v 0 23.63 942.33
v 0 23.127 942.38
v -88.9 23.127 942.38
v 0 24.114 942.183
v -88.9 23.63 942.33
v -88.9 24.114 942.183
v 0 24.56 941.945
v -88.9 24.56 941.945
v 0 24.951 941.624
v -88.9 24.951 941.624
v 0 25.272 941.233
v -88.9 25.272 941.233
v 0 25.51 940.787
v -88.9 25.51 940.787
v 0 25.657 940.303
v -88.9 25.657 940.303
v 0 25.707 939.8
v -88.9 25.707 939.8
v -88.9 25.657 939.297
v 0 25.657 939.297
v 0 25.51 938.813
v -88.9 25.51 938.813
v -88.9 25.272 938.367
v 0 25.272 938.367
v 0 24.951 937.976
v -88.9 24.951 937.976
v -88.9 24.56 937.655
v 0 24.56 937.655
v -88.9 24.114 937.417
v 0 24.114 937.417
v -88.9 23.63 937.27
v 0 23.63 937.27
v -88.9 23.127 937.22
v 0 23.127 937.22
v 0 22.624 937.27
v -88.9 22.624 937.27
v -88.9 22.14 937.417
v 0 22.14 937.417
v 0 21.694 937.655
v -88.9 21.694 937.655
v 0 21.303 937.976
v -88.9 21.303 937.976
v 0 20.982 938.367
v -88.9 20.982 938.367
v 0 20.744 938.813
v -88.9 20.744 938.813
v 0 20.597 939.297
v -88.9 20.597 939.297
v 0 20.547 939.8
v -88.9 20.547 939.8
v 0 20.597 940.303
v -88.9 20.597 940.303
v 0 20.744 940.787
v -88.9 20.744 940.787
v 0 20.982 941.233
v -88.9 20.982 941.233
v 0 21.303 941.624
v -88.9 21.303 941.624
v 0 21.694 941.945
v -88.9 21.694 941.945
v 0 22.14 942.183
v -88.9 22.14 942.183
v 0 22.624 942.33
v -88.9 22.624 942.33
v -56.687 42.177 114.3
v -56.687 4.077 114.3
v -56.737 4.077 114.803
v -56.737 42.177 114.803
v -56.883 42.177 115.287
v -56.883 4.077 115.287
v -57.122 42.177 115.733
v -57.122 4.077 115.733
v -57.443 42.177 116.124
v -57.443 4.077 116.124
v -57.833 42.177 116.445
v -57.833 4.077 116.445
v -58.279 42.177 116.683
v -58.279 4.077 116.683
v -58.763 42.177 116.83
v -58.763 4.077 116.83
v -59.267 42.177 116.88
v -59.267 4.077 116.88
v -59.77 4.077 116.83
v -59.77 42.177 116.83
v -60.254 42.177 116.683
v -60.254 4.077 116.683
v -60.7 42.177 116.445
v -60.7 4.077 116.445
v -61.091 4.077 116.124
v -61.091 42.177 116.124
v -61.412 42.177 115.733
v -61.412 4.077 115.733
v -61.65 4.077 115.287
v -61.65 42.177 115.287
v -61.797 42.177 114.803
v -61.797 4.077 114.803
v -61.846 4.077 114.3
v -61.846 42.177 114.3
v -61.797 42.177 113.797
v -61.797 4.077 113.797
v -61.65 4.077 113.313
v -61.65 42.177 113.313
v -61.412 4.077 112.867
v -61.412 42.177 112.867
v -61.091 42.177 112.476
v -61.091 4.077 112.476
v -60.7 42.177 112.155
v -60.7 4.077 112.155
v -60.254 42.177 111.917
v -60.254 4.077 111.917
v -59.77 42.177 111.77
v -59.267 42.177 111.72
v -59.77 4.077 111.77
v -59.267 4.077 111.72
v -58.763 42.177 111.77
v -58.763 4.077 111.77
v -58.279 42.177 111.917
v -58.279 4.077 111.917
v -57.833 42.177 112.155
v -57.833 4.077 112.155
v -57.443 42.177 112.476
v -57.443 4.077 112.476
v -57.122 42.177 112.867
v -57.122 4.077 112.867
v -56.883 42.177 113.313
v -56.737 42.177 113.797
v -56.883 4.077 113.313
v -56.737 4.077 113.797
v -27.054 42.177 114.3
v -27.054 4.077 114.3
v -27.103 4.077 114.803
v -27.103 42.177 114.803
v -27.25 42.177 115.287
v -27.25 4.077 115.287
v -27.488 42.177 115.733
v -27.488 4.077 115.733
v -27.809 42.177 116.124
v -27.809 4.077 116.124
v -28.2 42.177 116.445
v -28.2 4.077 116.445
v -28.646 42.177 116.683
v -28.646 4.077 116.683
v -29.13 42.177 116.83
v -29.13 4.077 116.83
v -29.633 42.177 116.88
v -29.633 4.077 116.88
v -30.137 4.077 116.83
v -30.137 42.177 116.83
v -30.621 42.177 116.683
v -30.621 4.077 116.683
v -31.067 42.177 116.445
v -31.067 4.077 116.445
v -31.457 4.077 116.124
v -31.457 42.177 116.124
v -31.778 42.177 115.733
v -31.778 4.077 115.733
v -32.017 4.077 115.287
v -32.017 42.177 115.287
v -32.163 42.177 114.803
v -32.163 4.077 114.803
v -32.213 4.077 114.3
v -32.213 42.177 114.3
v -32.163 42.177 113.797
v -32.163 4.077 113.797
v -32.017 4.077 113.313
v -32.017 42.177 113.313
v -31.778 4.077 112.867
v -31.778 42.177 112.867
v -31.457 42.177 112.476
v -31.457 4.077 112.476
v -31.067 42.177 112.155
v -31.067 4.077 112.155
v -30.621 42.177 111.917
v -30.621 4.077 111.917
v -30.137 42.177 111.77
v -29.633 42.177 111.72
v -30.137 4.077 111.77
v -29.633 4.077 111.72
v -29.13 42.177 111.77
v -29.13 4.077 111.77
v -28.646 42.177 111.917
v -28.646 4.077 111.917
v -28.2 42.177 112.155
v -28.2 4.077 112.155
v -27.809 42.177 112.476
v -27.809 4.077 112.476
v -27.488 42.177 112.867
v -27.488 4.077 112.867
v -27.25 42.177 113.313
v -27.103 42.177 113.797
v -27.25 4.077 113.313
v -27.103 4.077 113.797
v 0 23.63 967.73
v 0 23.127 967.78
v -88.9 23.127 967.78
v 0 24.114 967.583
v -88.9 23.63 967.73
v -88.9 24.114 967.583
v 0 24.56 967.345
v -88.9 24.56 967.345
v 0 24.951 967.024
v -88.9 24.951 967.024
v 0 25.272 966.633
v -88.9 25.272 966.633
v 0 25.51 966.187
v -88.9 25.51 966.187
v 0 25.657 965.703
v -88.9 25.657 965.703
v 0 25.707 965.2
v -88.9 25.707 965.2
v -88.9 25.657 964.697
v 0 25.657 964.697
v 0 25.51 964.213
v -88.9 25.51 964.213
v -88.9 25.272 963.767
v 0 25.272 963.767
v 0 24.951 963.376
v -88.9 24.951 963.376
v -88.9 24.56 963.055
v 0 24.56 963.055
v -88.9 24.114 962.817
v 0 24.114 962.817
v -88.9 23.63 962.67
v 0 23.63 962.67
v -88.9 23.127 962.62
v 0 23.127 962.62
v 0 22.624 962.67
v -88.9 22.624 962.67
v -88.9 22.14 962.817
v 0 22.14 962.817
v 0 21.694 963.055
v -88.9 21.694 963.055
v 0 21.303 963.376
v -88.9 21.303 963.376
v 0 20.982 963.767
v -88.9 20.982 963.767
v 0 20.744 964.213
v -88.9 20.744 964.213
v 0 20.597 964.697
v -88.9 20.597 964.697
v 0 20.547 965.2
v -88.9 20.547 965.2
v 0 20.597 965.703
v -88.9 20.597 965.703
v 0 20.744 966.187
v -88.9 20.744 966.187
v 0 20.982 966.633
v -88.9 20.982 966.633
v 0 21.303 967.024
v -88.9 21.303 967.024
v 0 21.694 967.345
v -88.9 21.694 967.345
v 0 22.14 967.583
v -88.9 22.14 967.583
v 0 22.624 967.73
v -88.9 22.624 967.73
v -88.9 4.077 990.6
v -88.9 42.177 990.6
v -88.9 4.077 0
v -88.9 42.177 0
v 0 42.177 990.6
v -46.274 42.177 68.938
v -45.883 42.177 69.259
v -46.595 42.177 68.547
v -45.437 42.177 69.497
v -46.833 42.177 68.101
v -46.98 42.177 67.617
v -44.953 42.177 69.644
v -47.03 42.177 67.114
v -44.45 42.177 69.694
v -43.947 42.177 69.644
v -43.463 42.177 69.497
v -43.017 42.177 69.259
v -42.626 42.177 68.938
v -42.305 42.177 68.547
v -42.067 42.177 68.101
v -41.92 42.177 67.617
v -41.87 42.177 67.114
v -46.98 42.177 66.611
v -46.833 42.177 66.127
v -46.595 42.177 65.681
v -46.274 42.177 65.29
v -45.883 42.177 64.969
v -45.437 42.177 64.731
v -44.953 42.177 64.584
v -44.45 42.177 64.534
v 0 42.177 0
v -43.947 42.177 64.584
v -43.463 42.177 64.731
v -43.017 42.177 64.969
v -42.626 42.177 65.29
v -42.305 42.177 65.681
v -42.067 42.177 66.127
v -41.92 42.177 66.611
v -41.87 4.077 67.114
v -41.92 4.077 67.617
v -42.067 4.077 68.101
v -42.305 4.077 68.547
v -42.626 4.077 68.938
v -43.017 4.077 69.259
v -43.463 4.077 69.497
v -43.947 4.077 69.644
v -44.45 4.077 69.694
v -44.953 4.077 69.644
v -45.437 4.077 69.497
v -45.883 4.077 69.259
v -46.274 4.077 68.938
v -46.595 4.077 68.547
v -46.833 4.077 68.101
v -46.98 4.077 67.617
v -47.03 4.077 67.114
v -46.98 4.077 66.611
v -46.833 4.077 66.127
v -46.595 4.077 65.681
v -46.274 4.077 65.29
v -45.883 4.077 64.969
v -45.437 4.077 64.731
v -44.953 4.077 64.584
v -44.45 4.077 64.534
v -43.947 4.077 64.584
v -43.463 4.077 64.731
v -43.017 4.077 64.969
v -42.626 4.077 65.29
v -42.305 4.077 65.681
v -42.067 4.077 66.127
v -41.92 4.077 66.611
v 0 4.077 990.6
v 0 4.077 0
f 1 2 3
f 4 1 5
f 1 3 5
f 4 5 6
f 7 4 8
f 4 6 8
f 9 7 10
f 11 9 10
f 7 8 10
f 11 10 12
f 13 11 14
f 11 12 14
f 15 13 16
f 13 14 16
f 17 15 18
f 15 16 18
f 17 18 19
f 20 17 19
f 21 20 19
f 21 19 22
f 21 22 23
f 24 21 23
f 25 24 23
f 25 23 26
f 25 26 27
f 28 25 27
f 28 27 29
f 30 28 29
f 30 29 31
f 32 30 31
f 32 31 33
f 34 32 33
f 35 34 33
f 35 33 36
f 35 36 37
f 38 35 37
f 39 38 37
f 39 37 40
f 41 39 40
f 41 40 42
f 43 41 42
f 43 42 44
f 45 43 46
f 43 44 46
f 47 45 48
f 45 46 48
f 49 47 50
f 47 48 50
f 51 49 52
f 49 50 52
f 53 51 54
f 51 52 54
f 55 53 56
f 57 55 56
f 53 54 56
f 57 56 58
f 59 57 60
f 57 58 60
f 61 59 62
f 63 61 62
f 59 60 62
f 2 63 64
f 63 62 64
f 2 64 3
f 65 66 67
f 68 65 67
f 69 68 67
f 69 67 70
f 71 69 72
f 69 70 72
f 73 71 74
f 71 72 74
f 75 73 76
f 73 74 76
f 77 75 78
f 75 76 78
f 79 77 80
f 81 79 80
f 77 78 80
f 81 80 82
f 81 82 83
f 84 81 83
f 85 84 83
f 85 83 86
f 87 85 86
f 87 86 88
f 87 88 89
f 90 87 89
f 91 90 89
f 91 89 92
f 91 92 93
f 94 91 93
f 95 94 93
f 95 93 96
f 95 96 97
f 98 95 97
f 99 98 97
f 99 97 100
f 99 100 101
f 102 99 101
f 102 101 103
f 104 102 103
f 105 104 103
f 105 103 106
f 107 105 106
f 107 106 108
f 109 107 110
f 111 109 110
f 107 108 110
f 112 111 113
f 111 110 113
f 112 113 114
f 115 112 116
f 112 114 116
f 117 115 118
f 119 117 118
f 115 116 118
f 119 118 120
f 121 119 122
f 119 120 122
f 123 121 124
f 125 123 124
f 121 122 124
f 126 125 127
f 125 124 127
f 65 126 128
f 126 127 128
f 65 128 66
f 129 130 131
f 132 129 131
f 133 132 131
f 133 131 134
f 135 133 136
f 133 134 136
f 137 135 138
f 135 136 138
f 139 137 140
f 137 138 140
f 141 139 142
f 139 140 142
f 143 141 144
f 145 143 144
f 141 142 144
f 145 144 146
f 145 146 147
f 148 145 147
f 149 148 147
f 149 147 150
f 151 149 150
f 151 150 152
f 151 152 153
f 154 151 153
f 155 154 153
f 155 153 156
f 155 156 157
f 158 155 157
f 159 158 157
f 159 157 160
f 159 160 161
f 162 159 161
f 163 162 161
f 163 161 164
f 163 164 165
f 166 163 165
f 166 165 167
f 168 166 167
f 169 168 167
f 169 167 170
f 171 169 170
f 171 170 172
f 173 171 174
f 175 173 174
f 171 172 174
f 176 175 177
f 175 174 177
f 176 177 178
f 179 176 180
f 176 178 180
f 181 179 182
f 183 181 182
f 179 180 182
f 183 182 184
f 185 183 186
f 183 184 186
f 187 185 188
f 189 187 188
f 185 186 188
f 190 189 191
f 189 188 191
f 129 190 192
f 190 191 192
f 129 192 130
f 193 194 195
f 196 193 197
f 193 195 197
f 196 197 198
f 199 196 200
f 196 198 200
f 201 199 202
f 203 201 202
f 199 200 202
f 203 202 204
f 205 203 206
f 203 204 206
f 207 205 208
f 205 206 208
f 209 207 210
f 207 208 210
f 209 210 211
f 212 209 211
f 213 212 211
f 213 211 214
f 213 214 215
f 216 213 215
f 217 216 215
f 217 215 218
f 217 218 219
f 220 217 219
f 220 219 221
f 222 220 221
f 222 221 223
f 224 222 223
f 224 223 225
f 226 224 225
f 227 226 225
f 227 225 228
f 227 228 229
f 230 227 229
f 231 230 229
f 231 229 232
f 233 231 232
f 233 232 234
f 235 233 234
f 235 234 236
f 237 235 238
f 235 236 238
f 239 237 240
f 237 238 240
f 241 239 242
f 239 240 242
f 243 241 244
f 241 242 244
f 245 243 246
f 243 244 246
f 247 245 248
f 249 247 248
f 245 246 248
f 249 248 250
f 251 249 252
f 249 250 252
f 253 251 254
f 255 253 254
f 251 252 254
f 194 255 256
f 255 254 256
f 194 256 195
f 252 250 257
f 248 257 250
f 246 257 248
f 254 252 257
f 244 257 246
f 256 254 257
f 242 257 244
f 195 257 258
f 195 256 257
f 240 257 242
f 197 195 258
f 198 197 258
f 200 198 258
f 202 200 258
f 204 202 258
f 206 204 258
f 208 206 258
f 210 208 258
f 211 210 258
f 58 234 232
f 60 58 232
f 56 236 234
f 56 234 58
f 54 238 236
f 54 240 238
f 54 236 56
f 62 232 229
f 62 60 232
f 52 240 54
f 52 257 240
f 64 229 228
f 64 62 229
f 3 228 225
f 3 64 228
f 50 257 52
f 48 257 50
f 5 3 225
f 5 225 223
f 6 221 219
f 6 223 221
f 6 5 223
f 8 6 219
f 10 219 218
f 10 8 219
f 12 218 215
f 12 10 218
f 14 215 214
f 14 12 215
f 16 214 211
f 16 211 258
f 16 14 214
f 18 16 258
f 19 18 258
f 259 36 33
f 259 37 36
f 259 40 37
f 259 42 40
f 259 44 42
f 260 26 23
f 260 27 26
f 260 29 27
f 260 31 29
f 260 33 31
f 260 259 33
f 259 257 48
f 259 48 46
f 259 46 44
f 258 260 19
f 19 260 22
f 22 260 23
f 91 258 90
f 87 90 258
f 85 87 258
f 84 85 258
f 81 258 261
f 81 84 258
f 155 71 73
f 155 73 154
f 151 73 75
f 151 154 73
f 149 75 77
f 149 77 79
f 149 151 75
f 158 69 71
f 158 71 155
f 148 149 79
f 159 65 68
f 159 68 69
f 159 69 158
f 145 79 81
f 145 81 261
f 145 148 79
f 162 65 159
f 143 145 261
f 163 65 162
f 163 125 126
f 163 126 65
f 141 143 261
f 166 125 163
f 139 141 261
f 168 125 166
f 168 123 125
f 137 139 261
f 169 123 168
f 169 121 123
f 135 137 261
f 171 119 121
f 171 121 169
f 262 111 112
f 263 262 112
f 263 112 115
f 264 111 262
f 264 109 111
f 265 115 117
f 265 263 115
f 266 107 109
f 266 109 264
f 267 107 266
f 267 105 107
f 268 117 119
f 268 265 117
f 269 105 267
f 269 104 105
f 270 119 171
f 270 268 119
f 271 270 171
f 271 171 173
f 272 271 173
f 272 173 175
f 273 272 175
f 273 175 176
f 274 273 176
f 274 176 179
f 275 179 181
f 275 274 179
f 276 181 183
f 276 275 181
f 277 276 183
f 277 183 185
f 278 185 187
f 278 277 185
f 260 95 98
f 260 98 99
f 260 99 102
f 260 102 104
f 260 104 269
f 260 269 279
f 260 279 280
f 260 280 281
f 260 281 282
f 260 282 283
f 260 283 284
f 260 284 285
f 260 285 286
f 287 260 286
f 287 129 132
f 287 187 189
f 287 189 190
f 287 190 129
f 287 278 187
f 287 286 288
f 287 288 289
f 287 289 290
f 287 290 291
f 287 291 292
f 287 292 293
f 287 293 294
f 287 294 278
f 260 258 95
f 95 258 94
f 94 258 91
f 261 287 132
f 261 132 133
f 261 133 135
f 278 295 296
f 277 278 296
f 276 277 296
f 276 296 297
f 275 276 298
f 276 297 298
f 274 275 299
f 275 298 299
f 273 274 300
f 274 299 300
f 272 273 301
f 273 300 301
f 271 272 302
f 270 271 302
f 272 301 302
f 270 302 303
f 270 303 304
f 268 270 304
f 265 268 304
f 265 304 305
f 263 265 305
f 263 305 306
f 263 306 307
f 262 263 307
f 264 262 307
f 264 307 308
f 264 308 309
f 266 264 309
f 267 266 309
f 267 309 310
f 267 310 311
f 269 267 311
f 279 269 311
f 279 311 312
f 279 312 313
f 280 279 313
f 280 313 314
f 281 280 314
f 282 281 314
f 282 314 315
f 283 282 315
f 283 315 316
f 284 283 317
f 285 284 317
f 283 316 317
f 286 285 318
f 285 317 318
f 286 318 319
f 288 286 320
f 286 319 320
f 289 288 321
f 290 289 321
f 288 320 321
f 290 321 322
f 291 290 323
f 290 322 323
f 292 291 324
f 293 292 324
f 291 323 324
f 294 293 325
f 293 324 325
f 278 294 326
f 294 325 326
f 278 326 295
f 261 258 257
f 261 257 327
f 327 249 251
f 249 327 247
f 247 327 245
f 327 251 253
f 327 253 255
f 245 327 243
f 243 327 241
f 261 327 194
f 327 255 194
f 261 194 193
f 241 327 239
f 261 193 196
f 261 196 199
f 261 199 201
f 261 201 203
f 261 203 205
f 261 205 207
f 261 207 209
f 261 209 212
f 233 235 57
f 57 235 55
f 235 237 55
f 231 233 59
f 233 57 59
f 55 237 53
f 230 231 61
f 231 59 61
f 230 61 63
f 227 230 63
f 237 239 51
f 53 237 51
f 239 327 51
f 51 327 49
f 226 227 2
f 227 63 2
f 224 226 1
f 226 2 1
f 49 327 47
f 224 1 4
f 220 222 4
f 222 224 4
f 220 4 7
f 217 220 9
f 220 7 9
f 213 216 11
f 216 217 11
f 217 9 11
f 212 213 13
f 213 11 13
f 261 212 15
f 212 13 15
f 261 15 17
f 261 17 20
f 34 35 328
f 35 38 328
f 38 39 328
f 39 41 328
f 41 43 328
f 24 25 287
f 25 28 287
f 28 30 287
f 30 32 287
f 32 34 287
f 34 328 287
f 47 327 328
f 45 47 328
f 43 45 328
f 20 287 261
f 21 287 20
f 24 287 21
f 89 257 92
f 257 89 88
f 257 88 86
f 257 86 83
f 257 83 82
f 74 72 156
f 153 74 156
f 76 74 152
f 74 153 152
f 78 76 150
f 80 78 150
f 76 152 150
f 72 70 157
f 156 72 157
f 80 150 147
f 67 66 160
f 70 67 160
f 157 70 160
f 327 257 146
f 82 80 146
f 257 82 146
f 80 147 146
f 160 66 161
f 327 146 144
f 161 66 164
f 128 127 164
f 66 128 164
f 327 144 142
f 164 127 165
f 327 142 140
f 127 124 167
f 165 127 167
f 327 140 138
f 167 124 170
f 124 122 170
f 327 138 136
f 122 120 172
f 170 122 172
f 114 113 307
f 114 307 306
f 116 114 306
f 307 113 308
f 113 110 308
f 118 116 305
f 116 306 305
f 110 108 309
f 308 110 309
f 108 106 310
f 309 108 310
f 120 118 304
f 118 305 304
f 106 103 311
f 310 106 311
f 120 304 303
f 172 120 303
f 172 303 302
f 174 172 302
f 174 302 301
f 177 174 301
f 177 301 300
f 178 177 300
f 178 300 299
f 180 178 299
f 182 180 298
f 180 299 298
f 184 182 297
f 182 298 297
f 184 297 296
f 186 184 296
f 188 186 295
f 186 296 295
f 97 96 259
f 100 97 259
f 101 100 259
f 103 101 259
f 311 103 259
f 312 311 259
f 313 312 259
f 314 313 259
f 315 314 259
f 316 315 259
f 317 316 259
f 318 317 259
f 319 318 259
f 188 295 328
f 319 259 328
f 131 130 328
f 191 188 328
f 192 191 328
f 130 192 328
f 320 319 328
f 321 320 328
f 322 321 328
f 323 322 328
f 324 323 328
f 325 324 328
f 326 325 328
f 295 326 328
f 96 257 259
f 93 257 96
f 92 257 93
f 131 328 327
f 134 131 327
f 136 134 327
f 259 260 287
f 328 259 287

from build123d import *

# Parameters (mm, degrees)
SKETCH1_W           = 88.9
SKETCH1_H           = 38.1
BOSS_EXTRUDE1_DEPTH = 990.6
SKETCH2_R           = 2.5796875
CUT_EXTRUDE1_DEPTH  = 89.9
SKETCH3_R           = 2.5796875
CUT_EXTRUDE2_DEPTH  = 39.1


with BuildPart() as part:
    # Sketch1 → Boss-Extrude1 (new body)
    with BuildSketch(Plane.XY):
        with Locations((-44.45, 23.126988636)):
            Rectangle(SKETCH1_W, SKETCH1_H)
    extrude(amount=BOSS_EXTRUDE1_DEPTH)

    # Sketch2 → Cut-Extrude1 (cut, through all)
    with BuildSketch(Plane.ZY.offset(88.9)):
        with Locations((939.8, 23.126988636)):
            Circle(SKETCH2_R)
        with Locations((965.2, 23.126988636)):
            Circle(SKETCH2_R)
    extrude(amount=-CUT_EXTRUDE1_DEPTH, mode=Mode.SUBTRACT)

    # Sketch3 → Cut-Extrude2 (cut, through all)
    with BuildSketch(Plane.XZ.offset(-4.076988636)):
        with Locations((-44.45, 67.113890037)):
            Circle(SKETCH3_R)
        with Locations((-29.633333333, 114.3)):
            Circle(SKETCH3_R)
        with Locations((-59.266666667, 114.3)):
            Circle(SKETCH3_R)
    extrude(amount=-CUT_EXTRUDE2_DEPTH, mode=Mode.SUBTRACT)


solid = part.part
